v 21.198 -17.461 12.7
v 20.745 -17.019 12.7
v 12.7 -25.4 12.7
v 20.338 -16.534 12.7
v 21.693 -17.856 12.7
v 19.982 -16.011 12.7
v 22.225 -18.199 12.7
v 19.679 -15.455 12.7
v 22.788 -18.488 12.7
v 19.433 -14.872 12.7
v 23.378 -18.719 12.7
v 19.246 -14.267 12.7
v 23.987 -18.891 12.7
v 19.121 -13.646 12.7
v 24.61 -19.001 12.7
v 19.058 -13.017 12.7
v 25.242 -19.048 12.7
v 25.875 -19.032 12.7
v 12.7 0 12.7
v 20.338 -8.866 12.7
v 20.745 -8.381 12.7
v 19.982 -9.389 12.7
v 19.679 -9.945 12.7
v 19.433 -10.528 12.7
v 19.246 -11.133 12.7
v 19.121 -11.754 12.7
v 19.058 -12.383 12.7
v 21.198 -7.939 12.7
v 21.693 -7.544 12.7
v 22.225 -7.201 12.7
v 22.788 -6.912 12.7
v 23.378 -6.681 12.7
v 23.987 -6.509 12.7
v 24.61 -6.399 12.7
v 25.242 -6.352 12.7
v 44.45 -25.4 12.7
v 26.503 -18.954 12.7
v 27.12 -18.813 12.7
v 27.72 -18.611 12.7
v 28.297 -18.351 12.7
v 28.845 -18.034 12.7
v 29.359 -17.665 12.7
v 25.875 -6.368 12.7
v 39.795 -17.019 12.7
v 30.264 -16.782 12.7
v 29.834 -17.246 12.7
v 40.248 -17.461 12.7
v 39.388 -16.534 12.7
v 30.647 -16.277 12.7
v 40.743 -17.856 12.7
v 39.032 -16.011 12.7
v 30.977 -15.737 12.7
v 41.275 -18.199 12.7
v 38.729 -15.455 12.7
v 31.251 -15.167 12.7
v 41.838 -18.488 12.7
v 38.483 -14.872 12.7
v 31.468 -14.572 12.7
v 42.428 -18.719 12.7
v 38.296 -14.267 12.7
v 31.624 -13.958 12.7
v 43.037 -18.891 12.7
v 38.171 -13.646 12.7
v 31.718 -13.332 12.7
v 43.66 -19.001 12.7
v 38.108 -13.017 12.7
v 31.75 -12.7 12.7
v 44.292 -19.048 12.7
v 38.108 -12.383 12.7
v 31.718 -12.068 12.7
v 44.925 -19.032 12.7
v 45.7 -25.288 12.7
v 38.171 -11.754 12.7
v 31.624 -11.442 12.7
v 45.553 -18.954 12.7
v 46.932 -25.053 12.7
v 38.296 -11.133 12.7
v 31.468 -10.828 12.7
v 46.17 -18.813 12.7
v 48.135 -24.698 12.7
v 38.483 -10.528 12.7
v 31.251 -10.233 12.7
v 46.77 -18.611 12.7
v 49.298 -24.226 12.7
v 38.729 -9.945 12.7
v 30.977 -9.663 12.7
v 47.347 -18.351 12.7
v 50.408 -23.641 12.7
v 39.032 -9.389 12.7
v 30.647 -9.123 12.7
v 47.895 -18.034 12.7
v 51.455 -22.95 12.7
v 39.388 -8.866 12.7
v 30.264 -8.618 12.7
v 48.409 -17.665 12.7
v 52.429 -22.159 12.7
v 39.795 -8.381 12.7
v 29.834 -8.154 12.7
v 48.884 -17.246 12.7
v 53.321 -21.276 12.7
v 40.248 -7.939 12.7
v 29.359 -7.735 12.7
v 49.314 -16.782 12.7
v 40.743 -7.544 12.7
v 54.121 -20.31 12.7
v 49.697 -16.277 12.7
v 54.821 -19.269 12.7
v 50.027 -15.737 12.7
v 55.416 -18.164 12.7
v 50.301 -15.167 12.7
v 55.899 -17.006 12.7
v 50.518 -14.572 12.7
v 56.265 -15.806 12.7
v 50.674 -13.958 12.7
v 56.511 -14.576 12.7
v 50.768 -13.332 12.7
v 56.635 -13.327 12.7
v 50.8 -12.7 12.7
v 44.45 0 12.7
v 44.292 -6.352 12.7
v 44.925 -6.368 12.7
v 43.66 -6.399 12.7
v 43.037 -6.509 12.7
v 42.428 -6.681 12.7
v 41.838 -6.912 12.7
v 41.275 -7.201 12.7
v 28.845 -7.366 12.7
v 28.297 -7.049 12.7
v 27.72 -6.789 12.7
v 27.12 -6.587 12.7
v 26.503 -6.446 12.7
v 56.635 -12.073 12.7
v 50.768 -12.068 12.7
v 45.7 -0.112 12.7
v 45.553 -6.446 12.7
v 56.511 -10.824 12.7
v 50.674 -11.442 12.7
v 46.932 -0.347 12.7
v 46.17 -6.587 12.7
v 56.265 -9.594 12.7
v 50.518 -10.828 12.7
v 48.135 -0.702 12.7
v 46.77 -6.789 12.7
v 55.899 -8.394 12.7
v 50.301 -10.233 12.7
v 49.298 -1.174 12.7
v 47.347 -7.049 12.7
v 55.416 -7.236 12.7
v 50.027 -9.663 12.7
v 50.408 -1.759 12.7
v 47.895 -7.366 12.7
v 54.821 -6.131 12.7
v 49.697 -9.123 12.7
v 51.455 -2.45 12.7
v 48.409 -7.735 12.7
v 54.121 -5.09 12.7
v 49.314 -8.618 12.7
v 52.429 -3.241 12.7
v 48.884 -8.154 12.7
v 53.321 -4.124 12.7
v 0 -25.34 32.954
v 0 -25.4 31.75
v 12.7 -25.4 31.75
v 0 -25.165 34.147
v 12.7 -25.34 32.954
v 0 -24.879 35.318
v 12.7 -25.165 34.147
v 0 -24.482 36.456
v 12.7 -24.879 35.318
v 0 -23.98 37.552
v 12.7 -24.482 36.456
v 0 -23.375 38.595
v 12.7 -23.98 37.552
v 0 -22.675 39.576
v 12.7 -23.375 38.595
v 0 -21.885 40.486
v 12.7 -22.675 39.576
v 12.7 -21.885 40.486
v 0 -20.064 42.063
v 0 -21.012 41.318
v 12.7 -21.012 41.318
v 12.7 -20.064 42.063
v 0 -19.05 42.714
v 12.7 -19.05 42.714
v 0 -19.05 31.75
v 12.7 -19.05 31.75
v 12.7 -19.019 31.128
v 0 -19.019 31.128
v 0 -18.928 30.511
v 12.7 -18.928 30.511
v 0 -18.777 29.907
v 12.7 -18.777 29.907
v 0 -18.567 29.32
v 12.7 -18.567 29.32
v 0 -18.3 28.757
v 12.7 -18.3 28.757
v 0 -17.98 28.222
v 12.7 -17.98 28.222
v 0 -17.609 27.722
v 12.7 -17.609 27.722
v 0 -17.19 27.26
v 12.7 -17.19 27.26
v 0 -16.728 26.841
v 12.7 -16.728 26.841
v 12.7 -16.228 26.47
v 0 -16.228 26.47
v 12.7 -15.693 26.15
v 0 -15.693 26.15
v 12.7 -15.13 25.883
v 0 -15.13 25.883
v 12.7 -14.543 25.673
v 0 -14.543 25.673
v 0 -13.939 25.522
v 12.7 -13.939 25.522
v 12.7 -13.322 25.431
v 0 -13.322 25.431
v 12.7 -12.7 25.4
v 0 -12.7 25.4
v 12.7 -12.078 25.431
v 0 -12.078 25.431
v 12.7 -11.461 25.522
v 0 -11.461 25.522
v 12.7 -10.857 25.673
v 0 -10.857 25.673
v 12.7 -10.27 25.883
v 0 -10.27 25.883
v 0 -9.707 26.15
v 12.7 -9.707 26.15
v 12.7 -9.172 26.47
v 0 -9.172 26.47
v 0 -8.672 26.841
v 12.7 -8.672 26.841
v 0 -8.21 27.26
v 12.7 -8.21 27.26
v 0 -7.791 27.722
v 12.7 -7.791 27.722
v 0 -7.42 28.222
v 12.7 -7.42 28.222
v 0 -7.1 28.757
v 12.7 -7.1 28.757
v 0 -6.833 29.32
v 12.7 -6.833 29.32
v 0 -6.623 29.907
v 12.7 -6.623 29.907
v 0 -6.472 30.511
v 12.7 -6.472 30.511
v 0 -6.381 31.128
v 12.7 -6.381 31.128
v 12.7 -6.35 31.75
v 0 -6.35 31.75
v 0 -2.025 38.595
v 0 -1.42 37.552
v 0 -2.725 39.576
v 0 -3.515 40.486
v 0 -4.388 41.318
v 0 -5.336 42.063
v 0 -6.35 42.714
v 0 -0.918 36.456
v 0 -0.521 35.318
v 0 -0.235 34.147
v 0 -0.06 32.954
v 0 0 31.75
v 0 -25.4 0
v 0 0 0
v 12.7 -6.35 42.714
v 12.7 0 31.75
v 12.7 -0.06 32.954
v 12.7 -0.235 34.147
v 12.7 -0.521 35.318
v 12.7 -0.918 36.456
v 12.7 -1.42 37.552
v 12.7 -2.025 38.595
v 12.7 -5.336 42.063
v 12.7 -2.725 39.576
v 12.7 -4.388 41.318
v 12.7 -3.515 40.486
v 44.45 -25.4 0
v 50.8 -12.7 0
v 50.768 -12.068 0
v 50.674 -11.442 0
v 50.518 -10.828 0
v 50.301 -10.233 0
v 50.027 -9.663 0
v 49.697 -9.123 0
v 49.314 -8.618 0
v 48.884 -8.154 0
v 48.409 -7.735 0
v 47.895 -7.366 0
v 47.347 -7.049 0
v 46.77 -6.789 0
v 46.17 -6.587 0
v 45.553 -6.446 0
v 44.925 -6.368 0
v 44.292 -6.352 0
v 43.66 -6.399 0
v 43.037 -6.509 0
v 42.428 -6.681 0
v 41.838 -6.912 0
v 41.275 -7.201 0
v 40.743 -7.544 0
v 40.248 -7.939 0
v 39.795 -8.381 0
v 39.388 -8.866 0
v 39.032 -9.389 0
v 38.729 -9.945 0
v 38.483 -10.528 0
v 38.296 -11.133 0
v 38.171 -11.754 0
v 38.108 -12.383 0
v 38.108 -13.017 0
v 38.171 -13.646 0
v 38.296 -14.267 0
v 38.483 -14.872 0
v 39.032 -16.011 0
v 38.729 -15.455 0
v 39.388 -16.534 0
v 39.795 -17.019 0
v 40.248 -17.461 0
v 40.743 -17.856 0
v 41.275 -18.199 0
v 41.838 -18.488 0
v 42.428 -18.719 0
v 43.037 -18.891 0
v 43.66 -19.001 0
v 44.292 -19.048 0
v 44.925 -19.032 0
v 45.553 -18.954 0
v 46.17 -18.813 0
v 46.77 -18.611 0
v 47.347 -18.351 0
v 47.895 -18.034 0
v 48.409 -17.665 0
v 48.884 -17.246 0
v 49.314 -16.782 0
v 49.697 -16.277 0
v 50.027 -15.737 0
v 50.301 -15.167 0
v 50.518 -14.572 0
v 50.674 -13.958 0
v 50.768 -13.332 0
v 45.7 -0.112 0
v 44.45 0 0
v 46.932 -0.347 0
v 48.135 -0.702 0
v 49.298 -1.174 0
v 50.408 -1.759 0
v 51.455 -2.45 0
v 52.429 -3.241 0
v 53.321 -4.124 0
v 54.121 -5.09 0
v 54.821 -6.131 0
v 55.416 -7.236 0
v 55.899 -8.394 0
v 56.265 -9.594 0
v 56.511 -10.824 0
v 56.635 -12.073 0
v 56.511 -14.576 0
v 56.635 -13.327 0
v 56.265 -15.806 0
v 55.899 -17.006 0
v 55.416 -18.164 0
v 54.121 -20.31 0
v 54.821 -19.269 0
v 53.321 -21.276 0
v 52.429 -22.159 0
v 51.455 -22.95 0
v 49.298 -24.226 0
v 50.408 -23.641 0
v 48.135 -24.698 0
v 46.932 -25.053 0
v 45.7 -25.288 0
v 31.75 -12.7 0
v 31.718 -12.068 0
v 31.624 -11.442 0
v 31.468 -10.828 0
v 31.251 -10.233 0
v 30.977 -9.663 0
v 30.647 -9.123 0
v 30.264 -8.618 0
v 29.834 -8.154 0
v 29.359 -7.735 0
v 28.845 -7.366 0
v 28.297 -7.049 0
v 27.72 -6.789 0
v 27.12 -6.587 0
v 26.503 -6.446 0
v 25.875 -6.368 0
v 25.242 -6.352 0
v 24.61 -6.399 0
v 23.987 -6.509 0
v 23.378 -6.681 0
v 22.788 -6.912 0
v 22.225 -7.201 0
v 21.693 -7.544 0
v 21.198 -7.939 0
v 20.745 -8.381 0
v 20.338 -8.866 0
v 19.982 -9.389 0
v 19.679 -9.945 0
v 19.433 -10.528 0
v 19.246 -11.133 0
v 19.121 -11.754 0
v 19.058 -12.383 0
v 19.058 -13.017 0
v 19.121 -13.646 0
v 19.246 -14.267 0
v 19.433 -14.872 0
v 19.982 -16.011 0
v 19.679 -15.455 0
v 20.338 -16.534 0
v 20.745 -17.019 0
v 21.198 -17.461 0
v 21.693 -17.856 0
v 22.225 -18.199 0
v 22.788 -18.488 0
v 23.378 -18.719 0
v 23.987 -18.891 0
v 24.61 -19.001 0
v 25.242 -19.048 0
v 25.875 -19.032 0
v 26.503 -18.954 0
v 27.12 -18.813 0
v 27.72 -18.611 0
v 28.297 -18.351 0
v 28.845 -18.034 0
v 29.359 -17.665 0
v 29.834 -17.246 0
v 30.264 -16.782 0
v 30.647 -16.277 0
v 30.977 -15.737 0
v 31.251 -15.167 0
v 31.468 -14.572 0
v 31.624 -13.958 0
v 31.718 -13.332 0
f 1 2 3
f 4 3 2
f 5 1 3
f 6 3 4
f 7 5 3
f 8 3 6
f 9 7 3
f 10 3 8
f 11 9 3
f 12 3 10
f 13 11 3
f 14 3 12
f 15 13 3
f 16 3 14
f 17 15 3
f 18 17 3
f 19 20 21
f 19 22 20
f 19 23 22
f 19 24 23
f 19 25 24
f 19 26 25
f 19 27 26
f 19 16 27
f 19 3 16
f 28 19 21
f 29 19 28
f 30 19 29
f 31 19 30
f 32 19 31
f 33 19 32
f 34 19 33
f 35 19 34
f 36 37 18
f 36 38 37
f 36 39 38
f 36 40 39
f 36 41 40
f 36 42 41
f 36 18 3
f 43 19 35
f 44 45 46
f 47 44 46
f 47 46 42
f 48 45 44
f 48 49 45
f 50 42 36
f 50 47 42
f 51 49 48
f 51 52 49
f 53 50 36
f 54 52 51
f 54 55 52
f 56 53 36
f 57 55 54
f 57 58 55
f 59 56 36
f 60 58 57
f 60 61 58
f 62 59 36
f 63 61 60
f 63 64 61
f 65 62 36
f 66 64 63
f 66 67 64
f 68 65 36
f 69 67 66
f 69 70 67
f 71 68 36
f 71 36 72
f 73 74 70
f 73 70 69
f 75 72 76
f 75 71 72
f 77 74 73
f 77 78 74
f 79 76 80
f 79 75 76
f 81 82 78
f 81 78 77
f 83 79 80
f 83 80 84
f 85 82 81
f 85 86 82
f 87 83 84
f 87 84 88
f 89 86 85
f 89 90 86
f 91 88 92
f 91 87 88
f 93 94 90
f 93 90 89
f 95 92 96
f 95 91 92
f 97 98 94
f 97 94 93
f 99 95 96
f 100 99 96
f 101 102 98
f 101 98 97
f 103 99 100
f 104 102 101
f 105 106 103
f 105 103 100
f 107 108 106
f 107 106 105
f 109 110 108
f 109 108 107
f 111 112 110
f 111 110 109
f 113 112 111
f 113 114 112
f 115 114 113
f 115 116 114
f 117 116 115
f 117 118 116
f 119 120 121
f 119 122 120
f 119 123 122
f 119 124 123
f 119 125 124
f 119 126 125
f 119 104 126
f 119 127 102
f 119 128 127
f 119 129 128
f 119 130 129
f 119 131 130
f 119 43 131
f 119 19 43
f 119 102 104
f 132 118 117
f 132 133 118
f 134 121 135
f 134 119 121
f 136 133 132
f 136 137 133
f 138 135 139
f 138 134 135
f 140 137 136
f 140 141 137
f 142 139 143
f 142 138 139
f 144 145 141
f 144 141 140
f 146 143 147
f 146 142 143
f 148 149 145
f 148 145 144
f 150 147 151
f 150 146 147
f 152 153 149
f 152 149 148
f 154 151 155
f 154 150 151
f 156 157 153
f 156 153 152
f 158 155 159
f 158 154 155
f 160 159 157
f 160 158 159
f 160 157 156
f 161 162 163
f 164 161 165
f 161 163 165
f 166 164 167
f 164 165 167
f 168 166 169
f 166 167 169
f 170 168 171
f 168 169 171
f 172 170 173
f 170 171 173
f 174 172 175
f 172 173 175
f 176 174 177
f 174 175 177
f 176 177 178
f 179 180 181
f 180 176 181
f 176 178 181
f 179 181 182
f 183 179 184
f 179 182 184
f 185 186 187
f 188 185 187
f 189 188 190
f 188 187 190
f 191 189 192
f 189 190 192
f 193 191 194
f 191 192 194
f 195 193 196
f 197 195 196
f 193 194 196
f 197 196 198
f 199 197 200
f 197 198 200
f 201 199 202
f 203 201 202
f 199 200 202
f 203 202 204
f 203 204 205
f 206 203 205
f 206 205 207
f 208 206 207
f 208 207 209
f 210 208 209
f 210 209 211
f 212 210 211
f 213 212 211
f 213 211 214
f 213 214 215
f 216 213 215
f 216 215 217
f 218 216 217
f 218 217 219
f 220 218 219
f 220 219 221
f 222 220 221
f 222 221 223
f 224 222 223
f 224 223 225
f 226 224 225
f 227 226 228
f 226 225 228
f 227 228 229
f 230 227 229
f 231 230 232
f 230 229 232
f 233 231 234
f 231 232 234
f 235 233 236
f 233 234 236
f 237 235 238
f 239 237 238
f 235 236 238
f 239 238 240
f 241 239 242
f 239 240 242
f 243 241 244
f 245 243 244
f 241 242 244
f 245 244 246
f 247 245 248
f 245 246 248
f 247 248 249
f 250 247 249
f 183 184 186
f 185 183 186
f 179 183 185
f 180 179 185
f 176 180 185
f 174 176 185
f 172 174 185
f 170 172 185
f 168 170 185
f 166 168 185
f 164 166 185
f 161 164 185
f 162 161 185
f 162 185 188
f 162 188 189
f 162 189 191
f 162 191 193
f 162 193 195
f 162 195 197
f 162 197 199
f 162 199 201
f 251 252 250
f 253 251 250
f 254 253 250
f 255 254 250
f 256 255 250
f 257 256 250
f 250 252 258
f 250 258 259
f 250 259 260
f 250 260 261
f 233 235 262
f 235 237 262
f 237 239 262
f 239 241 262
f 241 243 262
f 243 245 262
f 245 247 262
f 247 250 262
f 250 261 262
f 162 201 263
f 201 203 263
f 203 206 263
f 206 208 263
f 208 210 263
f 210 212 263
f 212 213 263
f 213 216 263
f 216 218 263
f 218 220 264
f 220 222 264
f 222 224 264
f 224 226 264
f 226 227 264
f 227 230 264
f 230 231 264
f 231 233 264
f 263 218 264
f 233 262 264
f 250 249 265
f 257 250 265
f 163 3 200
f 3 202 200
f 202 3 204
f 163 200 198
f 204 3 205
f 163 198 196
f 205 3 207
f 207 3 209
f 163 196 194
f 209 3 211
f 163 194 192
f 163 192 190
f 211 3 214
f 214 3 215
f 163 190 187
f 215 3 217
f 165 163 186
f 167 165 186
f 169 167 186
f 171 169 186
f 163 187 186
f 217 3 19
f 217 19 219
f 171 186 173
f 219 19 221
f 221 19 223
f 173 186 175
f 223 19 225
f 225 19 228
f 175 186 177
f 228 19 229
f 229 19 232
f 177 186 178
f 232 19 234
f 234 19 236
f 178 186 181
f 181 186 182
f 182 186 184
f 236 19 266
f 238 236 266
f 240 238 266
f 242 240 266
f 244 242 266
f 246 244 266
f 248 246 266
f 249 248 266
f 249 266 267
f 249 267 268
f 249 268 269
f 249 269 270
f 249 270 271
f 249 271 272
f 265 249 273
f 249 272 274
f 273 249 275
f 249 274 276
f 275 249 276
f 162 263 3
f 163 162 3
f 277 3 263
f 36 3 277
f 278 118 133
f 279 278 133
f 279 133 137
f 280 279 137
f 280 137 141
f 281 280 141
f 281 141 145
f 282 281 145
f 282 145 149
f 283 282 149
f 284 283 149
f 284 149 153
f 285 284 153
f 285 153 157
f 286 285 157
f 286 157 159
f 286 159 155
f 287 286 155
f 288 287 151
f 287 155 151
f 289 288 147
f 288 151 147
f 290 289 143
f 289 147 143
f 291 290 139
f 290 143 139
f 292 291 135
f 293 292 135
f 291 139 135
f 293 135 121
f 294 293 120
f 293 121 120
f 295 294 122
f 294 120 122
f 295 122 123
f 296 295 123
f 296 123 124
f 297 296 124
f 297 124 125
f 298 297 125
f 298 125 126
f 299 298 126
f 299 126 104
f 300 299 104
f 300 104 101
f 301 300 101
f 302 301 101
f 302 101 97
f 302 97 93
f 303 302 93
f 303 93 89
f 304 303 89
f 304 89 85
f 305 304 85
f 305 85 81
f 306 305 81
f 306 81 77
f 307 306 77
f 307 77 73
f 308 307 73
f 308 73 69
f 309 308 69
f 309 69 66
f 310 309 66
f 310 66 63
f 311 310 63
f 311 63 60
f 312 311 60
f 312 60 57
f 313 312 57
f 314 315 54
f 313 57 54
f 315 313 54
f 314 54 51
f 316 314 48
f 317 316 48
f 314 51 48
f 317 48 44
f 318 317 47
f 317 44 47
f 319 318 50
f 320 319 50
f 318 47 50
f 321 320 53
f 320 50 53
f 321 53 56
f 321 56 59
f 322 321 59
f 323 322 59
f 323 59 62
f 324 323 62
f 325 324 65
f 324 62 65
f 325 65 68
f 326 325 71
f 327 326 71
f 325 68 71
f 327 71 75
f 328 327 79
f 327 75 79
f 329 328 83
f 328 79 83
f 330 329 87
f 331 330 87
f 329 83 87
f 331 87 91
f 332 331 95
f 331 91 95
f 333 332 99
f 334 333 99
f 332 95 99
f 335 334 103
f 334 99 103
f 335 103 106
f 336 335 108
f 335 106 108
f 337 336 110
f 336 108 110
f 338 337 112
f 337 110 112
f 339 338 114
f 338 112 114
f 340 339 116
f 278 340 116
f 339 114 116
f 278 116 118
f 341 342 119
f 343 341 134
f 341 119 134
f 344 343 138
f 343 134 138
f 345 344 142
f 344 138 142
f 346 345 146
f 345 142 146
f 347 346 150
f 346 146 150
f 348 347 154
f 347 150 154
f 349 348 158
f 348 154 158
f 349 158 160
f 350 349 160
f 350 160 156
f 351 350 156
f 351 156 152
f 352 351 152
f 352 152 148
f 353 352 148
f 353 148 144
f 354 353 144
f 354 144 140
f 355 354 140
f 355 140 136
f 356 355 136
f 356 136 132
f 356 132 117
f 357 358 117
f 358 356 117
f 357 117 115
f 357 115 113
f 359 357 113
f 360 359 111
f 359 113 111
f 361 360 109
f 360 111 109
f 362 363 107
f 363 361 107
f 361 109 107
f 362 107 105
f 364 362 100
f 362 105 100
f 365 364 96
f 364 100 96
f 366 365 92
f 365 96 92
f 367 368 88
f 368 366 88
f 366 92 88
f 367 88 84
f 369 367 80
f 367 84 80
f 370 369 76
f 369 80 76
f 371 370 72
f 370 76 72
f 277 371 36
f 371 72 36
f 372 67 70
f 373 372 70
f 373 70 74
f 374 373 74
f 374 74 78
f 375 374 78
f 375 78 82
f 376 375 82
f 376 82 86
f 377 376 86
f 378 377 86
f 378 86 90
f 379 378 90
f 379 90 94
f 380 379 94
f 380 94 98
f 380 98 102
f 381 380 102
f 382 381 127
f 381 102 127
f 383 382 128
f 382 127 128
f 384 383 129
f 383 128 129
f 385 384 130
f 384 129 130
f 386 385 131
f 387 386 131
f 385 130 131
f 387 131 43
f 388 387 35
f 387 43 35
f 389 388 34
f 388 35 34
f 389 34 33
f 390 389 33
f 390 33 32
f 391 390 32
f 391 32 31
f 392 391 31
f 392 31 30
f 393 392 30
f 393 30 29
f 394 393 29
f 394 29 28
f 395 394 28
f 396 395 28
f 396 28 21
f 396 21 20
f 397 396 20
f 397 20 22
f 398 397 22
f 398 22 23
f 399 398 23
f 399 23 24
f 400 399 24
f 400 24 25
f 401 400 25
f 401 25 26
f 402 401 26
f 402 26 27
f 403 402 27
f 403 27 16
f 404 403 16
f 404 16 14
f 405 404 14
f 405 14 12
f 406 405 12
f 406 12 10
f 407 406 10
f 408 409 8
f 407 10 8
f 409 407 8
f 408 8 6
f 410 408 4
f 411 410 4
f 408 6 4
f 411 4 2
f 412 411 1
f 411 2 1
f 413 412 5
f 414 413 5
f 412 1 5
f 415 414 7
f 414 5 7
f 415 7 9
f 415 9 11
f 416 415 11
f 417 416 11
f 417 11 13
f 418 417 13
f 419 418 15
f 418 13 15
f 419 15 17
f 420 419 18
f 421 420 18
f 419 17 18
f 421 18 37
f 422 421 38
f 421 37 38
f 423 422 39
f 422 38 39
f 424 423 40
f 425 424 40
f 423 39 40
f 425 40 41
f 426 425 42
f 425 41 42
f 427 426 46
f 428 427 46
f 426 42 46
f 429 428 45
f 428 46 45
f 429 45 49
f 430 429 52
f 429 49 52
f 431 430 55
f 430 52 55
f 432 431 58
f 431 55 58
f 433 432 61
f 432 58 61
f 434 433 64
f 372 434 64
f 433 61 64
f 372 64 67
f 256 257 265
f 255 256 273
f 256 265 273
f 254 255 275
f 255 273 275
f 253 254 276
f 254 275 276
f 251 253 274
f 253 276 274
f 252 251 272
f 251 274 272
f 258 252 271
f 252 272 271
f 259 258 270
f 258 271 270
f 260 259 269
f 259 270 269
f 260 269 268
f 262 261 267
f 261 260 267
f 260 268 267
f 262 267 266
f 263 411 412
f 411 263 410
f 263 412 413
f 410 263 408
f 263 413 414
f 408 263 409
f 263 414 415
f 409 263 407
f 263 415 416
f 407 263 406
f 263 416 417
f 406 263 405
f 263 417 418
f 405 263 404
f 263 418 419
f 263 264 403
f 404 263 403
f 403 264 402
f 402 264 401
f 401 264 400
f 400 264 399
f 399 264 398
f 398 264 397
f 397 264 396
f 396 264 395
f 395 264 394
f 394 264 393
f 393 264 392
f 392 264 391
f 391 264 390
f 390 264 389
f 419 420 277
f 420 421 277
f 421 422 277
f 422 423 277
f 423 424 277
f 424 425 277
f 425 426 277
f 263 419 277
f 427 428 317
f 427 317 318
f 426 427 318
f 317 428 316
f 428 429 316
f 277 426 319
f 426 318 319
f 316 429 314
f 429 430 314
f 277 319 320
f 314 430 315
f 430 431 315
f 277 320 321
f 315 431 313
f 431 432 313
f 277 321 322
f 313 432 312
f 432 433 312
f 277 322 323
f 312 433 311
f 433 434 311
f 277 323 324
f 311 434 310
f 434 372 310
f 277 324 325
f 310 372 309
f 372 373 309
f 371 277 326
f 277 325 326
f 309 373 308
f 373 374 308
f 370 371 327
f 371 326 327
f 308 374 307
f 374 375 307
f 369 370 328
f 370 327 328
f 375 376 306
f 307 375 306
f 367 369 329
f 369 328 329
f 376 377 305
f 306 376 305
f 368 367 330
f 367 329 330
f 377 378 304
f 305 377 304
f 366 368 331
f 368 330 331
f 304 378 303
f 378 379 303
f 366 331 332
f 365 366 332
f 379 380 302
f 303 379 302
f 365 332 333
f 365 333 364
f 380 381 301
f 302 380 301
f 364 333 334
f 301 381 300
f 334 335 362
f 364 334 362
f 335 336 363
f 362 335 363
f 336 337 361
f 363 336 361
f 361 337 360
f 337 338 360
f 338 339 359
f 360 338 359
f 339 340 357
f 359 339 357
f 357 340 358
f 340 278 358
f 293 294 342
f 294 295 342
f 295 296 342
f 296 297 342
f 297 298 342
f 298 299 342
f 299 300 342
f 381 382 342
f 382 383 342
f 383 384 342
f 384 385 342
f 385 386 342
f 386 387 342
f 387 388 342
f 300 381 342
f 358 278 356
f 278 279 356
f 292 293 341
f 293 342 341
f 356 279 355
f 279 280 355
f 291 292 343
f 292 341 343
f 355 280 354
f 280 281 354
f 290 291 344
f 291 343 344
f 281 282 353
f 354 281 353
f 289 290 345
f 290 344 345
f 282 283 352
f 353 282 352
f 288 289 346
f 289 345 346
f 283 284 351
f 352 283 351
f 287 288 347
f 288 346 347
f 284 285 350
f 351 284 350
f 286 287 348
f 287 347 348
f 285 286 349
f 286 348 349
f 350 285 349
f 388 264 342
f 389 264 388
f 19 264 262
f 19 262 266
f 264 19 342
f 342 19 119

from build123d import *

# Parameters (mm, degrees)
F0_W     = 12.7
F0_H     = 31.75
F0_H_2   = 12.7
F0_W_2   = 44.45
F1_DEPTH = 25.4
F2_R     = 6.35
F3_DEPTH = 25.4
F5_DEPTH = 25.4


with BuildPart() as f1:
    # F0 (on Front) → F1 (new body)
    with BuildSketch(Plane.XZ):
        with Locations((6.35, 28.575)):
            Rectangle(F0_W, F0_H)
        with Locations((6.35, 6.35)):
            Rectangle(F0_W, F0_H_2)
        with Locations((34.925, 6.35)):
            Rectangle(F0_W_2, F0_H_2)
    extrude(amount=F1_DEPTH)

    # F2 (on face) → F3 (cut)
    with BuildSketch(Plane.XY.offset(12.7)):
        with Locations((25.4, -12.7)):
            Circle(F2_R)
        with Locations((44.45, -12.7)):
            Circle(F2_R)
        with BuildLine():
            ThreePointArc((44.45, 0), (56.6503530986, -12.7), (44.45, -25.4))
            Line((44.45, -25.4), (57.15, -25.4))
            Line((57.15, -25.4), (57.15, 0))
            Line((57.15, 0), (44.45, 0))
        make_face()
    extrude(amount=-F3_DEPTH, mode=Mode.SUBTRACT)

    # F4 (on face) → F5 (cut)
    with BuildSketch(Plane.YZ.offset(12.7)):
        with BuildLine():
            ThreePointArc((-19.05, 31.75), (-12.7, 25.4), (-6.35, 31.75))
            ThreePointArc((-6.35, 31.75), (-12.7, 38.1), (-19.05, 31.75))
        make_face()
        with BuildLine():
            ThreePointArc((-19.05, 31.75), (-12.7, 38.1), (-6.35, 31.75))
            Line((-6.35, 31.75), (-6.35, 42.7141417))
            ThreePointArc((-6.35, 42.7141417), (-12.7, 44.41561185), (-19.05, 42.7141417))
            Line((-19.05, 42.7141417), (-19.05, 31.75))
        make_face()
        with BuildLine():
            ThreePointArc((-25.4, 31.75), (-23.6899374795, 38.0805050685), (-19.05, 42.7141417))
            Line((-19.05, 42.7141417), (-19.05, 44.45))
            Line((-19.05, 44.45), (-25.4, 44.45))
            Line((-25.4, 44.45), (-25.4, 31.75))
        make_face()
        with BuildLine():
            ThreePointArc((-19.05, 42.7141417), (-12.7, 44.41561185), (-6.35, 42.7141417))
            Line((-6.35, 42.7141417), (-6.35, 44.45))
            Line((-6.35, 44.45), (-19.05, 44.45))
            Line((-19.05, 44.45), (-19.05, 42.7141417))
        make_face()
        with BuildLine():
            Line((-6.35, 44.45), (-6.35, 42.7141417))
            ThreePointArc((-6.35, 42.7141417), (-1.7100625205, 38.0805050685), (0, 31.75))
            Line((0, 31.75), (0, 44.45))
            Line((0, 44.45), (-6.35, 44.45))
        make_face()
    extrude(amount=-F5_DEPTH, mode=Mode.SUBTRACT)


solid = f1.part
